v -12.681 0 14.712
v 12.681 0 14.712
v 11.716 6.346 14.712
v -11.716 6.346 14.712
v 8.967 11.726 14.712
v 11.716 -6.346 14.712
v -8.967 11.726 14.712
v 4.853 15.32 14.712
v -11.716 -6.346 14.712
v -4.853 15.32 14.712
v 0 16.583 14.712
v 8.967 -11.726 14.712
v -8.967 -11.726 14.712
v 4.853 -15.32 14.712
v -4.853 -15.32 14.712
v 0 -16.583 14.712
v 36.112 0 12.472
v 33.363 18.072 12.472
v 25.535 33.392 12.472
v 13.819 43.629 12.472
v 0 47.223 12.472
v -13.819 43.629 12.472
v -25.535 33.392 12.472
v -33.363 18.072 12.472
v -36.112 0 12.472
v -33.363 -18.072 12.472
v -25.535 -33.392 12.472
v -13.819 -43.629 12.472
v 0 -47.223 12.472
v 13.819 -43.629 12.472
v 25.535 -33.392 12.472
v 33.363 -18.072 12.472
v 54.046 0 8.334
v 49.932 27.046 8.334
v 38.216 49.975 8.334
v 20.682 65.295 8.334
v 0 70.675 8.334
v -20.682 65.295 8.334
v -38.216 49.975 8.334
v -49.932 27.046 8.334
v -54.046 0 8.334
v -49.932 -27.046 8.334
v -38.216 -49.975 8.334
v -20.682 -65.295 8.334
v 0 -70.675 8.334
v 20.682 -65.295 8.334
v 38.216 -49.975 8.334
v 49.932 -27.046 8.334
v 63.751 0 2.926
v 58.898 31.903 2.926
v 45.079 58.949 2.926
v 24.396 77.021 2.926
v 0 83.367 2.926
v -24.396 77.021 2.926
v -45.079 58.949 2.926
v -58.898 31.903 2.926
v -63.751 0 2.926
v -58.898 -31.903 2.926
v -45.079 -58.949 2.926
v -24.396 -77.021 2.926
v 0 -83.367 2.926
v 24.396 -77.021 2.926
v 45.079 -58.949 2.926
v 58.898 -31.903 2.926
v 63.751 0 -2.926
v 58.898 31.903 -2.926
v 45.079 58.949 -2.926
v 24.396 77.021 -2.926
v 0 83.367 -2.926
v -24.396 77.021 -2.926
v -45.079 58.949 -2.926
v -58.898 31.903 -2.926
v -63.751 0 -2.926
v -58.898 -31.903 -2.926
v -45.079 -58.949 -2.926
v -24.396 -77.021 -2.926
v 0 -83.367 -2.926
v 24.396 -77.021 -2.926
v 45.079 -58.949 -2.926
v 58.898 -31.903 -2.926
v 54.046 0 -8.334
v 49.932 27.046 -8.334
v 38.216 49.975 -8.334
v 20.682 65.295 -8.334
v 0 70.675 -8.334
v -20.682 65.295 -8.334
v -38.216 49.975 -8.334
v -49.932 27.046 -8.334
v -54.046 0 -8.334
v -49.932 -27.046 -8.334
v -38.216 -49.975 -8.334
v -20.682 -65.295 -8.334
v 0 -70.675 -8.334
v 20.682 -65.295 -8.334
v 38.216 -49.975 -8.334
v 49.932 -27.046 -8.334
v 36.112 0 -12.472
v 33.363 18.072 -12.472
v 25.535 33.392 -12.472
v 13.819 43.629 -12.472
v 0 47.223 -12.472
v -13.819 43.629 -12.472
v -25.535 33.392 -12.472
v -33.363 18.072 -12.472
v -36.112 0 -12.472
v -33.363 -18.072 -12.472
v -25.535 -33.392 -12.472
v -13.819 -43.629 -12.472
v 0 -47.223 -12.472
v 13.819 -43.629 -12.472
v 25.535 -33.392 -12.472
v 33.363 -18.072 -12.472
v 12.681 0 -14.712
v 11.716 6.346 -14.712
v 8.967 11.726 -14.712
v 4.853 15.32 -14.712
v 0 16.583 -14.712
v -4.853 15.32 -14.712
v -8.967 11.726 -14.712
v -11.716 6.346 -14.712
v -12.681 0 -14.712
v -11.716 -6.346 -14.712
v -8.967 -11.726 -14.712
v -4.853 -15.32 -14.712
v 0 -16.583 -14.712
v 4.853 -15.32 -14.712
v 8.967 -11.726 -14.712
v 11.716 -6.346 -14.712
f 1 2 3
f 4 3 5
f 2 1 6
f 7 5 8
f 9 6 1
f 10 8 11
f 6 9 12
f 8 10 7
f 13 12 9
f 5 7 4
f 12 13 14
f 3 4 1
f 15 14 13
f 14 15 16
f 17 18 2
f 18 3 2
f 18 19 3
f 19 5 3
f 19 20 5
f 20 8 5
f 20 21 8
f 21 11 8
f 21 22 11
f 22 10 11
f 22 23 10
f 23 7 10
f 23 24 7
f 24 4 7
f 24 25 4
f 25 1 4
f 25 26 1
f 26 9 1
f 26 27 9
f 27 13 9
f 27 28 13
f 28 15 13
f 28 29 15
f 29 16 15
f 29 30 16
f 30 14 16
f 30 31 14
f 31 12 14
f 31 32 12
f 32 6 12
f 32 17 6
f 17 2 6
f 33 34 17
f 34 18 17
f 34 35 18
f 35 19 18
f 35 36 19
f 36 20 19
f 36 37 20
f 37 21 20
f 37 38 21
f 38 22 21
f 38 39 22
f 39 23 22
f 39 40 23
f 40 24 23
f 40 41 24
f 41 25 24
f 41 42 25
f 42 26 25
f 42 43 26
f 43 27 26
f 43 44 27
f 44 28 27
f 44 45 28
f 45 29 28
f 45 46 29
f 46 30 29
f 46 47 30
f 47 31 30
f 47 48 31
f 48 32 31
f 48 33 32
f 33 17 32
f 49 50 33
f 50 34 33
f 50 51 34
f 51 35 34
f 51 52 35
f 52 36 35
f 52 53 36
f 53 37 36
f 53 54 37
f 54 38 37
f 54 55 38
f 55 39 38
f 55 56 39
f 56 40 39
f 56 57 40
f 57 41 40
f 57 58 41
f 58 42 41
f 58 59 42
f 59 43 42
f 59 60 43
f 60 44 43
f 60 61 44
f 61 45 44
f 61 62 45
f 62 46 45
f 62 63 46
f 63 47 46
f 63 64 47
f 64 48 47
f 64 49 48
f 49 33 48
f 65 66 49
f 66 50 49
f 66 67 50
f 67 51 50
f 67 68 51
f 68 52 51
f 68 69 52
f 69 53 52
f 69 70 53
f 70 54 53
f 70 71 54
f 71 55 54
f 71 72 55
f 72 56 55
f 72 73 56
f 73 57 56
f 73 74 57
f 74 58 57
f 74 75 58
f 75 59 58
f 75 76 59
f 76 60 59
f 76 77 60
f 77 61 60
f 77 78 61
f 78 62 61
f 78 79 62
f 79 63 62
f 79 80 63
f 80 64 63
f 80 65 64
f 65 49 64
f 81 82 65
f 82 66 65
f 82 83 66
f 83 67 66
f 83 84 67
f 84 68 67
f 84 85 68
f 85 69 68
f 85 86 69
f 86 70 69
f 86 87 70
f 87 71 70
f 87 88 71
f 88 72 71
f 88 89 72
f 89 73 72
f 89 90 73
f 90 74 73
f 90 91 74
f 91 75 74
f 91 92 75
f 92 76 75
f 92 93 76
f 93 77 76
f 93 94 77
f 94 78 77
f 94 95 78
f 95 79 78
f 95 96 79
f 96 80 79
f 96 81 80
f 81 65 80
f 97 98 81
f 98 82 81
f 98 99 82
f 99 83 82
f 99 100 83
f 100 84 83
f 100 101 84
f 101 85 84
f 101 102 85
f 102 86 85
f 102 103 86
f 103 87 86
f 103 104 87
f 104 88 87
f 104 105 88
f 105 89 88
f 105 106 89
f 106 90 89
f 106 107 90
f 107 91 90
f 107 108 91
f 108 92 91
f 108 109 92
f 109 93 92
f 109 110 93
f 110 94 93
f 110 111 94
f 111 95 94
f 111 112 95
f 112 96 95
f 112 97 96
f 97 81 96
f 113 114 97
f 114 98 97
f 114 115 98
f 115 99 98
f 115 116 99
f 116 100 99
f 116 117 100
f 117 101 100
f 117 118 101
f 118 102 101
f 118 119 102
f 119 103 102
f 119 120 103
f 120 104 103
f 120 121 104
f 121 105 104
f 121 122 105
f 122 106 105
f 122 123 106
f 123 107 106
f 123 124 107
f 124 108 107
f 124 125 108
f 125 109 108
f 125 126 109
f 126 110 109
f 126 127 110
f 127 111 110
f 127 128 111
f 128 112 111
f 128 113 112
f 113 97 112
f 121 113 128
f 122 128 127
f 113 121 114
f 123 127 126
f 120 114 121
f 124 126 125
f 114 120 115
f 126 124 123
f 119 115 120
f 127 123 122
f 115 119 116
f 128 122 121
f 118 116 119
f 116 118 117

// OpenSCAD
// Generated by SolidPython 1.0.1 on 2020-07-29 00:46:51


scale(v = [13, 17, 3]) {
	sphere(r = 5);
}
/***********************************************
*********      SolidPython code:      **********
************************************************
 
# import packages: SolidPython
from solid import *
from solid.utils import *
from itertools import chain, combinations, permutations


class Resize:

    def __init__(self, scad_file):
        self.scad_file = scad_file
        #self.scad_file = import_scad(scad_file)
        # cone/cylinder param:
        self.r1 = 0
        self.r2 = 0
        self.h = 0
        # rectangular prism param:
        self.w = 0
        self.l = 0
        # ellipse param:
        self.r = 0

    # import OpenScad code (file name corresponds to shape)


    # classify shape + parameters
    def assign(self, param1, param2, param3):
        if self.scad_file == 'cone.scad':
            self.r1 = param1
            self.r2 = param2
            self.h = param3
        elif self.scad_file == 'cylinder.scad':
            self.r1 = param1
            self.r2 = param2
            self.h = param3
        elif self.scad_file == 'rectangularPrism.scad':
            self.h = param1
            self.l = param2
            self.w = param3
        else:
            self.r = param1
            self.h = param2

    # resize parameters
    def iterate(self):
        x = range(3, 20, 2)
        i = 1
        if self.scad_file == 'cone.scad':
            tempList = list(permutations(x, 2))
            for temp in tempList:
                param1 = temp[0]
                param2 = temp[1]
                filepath = 'produced_scad_files/' + 'cone' + str(param1) + '_' + str(param2) + '_' + '.scad'
                scad_render_to_file(cylinder(h=param1, r1=param2, r2=0), filepath)

        elif self.scad_file == 'cylinder.scad':
            tempList = list(permutations(x, 3))
            for temp in tempList:
                param1 = temp[0]
                param2 = temp[1]
                filepath = 'produced_scad_files/' + 'cylinder' + str(param1) + '_' + str(param2) + '_' + '.scad'
                scad_render_to_file(cylinder(h=param1, r1=param2, r2=param2), filepath)

        elif self.scad_file == 'rectangularPrism.scad':
            tempList = list(permutations(x, 3))
            for temp in tempList:
                param1 = temp[0]
                param2 = temp[1]
                param3 = temp[2]
                filepath = 'produced_scad_files/' + 'rectangularPrism' + str(param1) + '_' + str(param2) + '_' + str(
                    param3) + '.scad'
                scad_render_to_file(cube(size=(param1, param2, param3)), filepath)

        elif self.scad_file == 'ellipse.scad':
            tempList = list(permutations(x, 4))
            for temp in tempList:
                param1 = temp[0]
                param2 = temp[1]
                param3 = temp[2]
                param4 = temp[3]
                filepath = 'produced_scad_files/' + 'ellipse' + str(param1) + '_' + str(param2) + '_' + str(param3) + '_' + str(param4) + '.scad'
                scad_render_to_file(scale([param1, param2, param3])(sphere(r=param4)), filepath)

    def render_to_scadfile(self):
        scad_render_to_file(scad, 'example.scad') 
 
************************************************/
